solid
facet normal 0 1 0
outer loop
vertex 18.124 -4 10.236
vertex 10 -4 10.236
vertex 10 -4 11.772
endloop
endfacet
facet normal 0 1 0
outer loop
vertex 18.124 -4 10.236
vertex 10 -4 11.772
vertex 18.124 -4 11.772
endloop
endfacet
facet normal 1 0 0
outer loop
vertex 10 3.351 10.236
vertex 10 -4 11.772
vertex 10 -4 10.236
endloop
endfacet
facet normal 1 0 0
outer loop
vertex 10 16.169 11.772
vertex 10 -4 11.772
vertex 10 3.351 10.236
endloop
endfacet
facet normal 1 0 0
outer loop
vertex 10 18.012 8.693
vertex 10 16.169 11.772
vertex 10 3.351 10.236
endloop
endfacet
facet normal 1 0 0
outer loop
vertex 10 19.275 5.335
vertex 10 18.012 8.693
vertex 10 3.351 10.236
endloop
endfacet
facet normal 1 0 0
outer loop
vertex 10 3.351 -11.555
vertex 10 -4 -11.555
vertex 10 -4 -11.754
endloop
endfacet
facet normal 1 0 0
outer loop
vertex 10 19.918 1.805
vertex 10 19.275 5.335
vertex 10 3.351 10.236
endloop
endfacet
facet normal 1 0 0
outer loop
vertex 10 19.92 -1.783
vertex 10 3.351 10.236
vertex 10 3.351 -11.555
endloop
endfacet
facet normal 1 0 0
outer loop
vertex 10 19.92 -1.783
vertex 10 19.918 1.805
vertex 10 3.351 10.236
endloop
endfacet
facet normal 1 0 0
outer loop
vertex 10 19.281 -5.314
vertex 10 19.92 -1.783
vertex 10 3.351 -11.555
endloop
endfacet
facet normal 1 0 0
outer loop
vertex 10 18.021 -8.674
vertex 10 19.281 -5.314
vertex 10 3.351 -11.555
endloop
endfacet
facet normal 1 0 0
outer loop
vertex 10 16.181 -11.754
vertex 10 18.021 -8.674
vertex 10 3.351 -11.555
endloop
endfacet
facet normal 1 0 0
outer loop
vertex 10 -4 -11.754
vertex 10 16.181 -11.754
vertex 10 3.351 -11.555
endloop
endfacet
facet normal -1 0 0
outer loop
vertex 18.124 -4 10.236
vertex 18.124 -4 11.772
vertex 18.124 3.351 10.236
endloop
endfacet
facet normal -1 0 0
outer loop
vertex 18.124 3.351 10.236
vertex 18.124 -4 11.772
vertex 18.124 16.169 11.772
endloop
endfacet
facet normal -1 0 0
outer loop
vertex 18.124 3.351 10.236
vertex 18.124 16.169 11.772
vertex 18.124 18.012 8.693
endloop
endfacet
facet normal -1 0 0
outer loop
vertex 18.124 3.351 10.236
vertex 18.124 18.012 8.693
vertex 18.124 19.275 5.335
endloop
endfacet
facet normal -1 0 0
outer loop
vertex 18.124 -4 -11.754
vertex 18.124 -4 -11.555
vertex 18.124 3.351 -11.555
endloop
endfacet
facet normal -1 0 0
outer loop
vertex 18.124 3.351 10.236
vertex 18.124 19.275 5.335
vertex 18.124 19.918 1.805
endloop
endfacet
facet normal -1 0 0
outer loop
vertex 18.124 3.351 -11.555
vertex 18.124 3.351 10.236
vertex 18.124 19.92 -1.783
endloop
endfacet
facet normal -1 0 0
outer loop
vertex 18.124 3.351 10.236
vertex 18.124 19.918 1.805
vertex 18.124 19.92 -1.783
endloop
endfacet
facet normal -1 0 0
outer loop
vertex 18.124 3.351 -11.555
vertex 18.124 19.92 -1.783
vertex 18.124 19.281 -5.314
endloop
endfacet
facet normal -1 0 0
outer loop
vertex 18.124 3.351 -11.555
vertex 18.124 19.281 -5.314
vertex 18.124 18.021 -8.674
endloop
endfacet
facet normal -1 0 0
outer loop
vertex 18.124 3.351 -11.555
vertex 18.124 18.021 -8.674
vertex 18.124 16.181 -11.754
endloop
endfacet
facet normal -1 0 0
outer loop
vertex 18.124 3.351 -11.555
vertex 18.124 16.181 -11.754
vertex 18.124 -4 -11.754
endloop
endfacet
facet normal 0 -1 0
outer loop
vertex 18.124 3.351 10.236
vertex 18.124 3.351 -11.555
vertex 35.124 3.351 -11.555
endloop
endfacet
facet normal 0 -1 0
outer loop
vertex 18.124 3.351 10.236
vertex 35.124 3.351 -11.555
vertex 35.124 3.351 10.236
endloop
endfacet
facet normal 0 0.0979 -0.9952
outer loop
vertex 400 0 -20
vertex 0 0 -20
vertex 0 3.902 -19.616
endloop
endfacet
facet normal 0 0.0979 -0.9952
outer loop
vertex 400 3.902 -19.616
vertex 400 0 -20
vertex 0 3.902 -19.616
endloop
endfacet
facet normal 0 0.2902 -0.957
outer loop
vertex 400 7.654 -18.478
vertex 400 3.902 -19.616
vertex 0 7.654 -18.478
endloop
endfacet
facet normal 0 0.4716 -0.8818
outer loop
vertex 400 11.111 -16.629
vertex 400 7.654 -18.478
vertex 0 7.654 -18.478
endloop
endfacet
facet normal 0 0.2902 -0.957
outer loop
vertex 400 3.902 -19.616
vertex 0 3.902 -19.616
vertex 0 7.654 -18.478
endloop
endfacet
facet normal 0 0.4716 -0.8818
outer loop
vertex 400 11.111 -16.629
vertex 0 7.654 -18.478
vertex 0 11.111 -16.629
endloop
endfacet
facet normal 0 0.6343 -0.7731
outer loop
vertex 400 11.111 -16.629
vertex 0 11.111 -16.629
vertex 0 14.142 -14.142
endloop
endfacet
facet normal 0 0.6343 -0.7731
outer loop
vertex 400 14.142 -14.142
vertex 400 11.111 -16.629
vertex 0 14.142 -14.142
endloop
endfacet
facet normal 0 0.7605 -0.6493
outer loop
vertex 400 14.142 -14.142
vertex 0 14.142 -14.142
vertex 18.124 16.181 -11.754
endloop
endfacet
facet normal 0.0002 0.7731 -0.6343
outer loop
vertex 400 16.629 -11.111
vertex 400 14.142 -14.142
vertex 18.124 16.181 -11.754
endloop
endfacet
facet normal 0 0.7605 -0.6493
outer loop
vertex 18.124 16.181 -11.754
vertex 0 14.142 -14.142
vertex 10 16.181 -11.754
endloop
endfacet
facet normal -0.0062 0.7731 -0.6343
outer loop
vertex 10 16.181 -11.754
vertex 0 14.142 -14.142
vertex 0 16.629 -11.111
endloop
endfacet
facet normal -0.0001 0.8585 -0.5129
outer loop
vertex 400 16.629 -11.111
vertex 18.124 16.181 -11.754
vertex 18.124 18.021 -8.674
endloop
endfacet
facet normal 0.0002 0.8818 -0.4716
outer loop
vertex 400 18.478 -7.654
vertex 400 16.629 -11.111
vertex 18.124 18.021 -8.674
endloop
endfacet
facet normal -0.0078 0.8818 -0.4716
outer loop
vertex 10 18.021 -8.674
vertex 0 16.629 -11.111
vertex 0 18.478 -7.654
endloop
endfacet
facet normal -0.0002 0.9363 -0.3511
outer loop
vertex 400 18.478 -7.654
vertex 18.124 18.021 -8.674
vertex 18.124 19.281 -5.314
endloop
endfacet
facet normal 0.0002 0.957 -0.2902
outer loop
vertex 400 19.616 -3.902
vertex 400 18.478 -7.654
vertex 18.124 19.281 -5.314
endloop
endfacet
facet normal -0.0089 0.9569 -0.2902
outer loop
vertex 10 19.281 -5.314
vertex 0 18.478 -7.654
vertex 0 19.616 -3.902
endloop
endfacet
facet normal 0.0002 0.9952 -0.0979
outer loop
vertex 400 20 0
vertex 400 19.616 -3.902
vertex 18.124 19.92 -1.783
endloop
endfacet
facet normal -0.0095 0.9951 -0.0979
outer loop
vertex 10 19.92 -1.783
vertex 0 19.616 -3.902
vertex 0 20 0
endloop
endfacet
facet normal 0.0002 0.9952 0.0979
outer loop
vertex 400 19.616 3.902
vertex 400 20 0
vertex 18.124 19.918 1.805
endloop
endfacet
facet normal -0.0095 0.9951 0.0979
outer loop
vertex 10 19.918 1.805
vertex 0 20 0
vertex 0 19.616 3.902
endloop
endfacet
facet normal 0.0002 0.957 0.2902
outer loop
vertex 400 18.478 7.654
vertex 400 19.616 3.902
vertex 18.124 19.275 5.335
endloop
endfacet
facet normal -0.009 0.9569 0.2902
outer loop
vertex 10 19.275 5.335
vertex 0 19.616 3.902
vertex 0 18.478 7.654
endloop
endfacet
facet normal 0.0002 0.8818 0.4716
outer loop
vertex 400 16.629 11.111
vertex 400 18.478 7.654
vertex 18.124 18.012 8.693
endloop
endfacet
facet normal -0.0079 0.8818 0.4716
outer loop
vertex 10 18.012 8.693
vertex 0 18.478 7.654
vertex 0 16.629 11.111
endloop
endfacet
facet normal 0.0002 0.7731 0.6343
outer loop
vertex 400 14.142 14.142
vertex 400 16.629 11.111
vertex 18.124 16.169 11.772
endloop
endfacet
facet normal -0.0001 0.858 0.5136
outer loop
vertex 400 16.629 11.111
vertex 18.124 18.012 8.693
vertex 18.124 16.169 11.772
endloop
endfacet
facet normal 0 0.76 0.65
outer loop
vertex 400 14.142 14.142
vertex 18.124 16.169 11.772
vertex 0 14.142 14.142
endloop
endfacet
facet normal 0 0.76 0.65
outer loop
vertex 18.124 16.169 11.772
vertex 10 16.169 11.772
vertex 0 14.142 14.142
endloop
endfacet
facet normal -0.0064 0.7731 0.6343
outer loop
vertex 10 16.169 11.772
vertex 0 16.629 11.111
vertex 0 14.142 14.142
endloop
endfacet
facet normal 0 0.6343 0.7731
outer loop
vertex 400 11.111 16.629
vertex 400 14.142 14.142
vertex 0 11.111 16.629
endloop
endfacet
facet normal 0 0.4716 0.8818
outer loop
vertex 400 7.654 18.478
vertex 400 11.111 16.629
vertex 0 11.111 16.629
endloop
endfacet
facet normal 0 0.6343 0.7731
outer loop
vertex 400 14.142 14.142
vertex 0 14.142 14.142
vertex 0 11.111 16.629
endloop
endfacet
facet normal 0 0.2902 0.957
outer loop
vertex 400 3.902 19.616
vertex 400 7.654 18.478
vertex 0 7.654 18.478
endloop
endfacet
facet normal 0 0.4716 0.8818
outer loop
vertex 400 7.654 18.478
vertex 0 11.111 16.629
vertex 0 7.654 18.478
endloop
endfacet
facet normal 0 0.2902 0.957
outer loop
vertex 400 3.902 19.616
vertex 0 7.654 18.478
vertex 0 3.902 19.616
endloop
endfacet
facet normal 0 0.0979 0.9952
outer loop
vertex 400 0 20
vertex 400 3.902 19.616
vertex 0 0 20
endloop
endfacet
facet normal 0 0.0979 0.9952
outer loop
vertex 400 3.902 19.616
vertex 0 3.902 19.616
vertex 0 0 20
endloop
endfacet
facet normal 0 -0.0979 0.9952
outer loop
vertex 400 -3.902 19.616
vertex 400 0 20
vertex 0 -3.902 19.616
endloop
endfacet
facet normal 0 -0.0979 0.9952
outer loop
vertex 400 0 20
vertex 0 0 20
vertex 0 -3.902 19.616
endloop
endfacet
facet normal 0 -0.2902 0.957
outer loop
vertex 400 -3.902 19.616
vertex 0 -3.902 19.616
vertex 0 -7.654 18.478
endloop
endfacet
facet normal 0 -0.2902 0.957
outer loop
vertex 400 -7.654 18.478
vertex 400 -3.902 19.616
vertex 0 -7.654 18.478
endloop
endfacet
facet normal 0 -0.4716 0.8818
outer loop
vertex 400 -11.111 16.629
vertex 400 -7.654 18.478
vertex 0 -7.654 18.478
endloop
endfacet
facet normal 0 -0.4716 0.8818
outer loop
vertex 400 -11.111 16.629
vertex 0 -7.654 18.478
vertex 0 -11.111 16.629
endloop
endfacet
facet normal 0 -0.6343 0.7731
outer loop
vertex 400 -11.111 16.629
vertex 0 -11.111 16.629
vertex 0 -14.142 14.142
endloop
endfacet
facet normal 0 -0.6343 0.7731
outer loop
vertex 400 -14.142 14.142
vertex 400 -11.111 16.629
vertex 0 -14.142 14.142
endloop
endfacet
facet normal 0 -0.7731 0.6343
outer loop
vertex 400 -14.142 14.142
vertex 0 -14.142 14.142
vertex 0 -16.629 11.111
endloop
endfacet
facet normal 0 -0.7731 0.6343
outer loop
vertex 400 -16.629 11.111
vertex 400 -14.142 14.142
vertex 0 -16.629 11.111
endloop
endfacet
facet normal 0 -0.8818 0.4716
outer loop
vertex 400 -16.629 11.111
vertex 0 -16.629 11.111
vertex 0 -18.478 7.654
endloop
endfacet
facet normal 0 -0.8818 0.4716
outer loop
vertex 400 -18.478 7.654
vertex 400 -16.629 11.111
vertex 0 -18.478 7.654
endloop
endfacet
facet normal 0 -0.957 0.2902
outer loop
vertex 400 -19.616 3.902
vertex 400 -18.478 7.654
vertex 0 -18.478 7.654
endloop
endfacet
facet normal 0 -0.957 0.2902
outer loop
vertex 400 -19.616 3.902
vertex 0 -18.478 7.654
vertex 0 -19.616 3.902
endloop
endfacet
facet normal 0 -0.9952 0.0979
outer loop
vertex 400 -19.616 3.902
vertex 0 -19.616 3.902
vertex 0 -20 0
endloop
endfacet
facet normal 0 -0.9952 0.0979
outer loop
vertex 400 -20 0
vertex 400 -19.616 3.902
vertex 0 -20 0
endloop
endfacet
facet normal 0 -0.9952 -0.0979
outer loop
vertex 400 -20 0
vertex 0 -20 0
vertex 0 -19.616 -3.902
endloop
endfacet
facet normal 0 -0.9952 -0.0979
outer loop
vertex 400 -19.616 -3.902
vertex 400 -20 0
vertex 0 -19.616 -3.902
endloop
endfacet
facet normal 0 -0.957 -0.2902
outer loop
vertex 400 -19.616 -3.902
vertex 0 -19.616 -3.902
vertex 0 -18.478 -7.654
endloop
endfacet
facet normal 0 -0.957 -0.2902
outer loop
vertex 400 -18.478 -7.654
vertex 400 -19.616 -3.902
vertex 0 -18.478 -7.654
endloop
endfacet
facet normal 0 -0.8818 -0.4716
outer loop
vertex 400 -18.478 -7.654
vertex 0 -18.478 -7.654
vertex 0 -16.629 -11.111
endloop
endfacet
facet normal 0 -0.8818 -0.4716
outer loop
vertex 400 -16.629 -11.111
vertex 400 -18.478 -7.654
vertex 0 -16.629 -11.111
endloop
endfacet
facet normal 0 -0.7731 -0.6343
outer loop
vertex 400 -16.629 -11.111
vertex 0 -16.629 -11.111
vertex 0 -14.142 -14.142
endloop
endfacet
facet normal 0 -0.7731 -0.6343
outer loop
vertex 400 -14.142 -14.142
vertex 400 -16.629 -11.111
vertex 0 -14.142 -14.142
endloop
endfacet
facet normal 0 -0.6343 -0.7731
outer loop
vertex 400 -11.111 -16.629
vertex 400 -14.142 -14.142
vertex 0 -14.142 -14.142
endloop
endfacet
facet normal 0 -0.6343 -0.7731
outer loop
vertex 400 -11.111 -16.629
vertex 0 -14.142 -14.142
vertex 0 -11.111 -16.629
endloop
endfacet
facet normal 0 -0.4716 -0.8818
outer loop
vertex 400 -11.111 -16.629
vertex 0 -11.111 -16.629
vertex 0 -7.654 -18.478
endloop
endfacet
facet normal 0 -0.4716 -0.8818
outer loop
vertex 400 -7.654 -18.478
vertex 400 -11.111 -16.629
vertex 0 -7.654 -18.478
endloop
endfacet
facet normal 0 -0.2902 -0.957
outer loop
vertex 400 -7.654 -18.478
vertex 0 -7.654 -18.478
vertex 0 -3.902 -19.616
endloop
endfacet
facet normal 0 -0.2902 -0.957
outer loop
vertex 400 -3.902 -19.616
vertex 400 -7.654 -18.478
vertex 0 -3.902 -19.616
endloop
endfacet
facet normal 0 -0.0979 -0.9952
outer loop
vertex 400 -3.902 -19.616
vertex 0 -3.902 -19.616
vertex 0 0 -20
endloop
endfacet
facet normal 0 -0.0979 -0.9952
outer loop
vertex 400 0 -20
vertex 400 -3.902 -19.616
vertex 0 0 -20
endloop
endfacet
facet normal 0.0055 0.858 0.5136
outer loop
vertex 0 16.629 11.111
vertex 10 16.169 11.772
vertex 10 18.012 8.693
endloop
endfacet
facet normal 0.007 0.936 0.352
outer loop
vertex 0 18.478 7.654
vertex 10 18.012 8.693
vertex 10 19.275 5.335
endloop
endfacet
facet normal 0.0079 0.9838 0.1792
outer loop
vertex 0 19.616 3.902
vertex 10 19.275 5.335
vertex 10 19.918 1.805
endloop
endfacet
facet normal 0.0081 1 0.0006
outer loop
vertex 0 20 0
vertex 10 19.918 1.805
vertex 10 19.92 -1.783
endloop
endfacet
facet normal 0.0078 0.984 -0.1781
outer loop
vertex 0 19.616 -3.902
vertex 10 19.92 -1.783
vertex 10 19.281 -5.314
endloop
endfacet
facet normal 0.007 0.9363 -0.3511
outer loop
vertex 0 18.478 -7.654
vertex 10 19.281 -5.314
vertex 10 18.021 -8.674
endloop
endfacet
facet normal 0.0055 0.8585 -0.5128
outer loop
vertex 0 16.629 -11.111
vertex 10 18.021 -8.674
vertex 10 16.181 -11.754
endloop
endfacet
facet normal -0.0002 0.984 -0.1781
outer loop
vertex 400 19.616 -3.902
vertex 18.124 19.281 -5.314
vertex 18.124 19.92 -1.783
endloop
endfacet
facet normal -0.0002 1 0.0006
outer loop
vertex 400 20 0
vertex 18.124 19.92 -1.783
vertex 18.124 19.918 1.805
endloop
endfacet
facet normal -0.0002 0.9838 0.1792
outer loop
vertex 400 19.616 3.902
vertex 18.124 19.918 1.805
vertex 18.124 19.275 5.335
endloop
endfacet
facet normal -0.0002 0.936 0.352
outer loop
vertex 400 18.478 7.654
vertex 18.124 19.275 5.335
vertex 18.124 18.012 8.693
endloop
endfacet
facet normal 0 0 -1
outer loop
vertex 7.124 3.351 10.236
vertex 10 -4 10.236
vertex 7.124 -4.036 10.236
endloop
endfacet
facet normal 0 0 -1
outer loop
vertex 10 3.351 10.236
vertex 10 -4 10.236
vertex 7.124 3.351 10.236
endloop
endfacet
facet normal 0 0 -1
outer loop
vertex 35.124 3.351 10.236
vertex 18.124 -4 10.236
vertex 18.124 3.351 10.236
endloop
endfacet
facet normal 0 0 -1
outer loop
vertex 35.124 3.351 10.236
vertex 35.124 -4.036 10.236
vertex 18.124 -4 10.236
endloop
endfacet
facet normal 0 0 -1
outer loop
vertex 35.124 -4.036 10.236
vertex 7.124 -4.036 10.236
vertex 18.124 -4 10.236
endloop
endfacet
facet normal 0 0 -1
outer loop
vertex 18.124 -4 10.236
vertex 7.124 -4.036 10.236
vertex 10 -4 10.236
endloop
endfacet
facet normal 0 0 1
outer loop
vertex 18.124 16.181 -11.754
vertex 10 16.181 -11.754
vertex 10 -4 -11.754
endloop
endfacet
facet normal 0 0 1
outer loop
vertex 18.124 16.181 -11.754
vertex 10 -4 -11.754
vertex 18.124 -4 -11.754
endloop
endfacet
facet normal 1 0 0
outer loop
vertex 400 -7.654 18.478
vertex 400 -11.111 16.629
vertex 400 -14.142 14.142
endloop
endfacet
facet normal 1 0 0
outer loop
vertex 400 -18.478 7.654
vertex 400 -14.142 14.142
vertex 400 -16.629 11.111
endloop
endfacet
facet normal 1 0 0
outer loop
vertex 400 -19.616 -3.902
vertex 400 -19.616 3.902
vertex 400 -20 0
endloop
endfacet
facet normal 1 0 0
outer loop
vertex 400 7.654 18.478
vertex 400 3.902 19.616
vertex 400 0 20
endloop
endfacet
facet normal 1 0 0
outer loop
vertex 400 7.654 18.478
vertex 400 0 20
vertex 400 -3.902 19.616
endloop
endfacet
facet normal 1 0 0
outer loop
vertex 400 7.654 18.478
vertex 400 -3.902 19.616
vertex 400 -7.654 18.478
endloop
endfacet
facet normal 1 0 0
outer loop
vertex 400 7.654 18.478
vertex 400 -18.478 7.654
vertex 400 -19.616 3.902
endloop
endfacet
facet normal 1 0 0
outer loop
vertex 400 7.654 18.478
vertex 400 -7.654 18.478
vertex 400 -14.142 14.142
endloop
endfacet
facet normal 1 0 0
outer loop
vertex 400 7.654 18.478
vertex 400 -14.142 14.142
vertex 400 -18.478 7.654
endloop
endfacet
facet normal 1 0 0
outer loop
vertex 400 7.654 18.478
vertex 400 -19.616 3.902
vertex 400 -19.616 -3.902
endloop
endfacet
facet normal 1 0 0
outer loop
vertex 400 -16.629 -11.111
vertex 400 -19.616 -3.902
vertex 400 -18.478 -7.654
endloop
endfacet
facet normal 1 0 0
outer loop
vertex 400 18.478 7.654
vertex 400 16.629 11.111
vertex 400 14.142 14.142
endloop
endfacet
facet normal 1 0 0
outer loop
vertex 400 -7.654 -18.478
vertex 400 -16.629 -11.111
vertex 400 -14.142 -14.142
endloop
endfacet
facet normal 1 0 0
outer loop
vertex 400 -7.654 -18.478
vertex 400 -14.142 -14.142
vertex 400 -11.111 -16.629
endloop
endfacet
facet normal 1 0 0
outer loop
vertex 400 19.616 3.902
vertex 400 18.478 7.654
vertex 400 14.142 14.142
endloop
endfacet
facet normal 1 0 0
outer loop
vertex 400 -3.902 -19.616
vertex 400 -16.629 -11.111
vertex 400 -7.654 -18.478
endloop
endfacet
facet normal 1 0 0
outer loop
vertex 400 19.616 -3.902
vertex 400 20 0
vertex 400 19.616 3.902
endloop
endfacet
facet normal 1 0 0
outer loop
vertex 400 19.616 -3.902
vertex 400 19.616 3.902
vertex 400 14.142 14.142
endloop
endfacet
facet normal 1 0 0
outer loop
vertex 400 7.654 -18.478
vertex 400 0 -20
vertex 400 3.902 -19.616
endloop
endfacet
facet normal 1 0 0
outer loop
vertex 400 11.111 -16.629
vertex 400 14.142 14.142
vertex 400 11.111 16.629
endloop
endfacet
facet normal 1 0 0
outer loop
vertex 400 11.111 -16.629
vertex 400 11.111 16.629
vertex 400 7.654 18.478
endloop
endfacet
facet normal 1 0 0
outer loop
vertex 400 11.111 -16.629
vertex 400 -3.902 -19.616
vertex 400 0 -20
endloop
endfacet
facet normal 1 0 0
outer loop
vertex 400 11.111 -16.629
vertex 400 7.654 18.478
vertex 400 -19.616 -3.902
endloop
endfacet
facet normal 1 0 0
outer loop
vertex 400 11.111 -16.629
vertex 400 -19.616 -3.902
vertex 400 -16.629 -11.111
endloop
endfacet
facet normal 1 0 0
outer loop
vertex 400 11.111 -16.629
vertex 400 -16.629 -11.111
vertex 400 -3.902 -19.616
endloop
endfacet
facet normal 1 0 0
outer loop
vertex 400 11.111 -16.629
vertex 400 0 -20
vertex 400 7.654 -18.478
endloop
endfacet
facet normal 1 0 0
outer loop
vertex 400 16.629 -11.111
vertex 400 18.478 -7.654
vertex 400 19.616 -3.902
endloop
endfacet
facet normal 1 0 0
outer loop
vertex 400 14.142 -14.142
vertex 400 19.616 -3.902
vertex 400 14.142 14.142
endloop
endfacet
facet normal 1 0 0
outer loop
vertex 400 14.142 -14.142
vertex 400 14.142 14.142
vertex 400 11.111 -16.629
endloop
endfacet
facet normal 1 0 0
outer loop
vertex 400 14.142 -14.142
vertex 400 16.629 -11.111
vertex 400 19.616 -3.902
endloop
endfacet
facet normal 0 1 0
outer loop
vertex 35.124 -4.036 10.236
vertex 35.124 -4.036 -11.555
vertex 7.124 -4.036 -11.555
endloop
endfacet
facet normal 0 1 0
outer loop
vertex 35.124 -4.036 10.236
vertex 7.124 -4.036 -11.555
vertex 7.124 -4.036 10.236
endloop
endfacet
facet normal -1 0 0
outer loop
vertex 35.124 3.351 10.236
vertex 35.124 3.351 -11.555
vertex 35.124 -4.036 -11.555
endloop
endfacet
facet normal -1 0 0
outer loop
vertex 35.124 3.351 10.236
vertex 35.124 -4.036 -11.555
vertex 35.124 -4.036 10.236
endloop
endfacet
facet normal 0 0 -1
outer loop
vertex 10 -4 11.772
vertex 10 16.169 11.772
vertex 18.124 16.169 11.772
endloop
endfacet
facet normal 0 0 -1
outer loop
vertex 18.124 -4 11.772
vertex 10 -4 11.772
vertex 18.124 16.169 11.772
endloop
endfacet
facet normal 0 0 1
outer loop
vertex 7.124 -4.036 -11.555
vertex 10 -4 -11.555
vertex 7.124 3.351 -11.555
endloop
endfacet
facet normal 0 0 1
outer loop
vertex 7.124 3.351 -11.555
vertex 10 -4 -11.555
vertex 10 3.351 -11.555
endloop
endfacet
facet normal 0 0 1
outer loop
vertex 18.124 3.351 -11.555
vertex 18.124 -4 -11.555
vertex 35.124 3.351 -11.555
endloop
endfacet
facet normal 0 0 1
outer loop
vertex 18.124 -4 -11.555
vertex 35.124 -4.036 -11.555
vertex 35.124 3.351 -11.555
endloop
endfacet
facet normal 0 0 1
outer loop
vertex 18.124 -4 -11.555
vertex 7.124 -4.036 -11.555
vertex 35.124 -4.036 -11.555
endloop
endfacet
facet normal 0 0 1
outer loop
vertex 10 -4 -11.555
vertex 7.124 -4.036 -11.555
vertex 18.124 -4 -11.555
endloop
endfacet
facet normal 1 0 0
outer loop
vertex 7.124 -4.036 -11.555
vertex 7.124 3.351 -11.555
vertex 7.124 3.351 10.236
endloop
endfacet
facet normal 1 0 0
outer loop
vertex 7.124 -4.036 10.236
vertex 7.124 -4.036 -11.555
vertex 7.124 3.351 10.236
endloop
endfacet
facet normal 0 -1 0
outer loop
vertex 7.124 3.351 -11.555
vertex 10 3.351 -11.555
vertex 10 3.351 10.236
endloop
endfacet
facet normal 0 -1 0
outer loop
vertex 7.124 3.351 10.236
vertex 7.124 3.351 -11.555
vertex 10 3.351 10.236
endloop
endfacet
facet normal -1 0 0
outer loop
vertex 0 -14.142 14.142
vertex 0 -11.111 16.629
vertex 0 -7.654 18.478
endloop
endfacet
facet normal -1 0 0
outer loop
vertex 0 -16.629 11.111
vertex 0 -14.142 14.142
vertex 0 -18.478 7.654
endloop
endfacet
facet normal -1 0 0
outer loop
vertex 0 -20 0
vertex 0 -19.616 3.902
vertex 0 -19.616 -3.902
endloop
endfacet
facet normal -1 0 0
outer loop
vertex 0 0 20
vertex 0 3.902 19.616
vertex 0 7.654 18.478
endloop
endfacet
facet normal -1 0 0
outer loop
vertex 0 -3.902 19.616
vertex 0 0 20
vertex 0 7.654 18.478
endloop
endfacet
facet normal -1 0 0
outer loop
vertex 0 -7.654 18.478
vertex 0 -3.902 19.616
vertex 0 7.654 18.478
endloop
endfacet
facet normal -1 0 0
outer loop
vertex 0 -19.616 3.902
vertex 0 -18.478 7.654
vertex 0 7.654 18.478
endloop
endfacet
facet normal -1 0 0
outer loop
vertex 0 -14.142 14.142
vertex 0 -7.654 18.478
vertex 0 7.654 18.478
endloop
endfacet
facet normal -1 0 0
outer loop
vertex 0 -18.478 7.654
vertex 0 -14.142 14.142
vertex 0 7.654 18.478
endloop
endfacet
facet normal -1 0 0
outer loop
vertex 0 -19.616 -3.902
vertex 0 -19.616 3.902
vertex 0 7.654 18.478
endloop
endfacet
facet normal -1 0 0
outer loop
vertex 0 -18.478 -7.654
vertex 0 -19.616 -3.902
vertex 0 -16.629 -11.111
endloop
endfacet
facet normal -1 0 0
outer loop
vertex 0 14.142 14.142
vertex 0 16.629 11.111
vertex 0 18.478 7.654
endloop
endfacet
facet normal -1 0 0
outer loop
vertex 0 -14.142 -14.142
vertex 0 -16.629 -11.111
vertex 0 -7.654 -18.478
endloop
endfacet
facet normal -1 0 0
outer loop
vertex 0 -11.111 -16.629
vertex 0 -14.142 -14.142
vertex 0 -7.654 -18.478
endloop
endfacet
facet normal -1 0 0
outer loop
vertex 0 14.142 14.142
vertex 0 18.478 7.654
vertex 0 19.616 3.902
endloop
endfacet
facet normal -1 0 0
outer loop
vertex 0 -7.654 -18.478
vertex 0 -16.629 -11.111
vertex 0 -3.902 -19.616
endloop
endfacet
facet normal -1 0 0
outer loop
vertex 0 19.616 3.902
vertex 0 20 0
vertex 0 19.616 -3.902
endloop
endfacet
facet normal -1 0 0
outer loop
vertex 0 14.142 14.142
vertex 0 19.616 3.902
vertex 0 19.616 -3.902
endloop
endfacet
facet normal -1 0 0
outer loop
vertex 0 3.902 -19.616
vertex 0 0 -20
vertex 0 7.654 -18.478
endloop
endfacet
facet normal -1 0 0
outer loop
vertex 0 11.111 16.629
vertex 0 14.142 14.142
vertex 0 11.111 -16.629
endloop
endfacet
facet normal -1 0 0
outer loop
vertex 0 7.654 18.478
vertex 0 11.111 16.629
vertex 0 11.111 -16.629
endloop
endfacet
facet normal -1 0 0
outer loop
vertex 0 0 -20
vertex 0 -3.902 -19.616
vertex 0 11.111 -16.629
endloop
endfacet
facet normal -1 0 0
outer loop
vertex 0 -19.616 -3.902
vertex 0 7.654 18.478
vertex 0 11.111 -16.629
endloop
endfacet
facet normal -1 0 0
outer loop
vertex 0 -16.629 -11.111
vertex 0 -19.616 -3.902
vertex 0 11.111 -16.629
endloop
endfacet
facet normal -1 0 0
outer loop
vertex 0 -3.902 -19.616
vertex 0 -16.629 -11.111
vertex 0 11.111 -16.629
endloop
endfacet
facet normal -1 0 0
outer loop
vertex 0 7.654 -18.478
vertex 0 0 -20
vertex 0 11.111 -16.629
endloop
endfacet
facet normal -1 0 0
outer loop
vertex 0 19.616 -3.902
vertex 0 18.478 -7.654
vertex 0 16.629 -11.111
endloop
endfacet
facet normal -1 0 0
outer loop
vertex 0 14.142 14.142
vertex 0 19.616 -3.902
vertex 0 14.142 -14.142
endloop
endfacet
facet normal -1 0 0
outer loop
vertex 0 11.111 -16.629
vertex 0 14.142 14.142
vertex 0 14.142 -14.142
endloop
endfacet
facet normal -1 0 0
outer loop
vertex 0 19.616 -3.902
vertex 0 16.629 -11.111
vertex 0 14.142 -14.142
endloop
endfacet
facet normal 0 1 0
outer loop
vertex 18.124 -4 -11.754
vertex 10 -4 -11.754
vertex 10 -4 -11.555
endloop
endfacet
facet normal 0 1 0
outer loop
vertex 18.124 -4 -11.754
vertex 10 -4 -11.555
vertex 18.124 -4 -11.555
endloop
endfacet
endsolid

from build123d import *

# Parameters (mm, degrees)
SKETCH2_R           = 20
BOSS_EXTRUDE1_DEPTH = 400
SKETCH3_W           = 8.124111934
SKETCH3_H           = 23.526074142
CUT_EXTRUDE1_DEPTH  = 24
SKETCH5_W           = 21.791522519
SKETCH5_H           = 7.386956786
CUT_EXTRUDE2_DEPTH  = 17
SKETCH5_2_W         = 21.791522519
SKETCH5_2_H         = 7.386956786
CUT_EXTRUDE3_DEPTH  = 11


with BuildPart() as part:
    # Sketch2 → Boss-Extrude1 (new body)
    with BuildSketch(Plane(origin=(0, 0, 0), x_dir=(0, 0, -1), z_dir=(1, 0, 0))):
        Circle(SKETCH2_R)
    extrude(amount=BOSS_EXTRUDE1_DEPTH)

    # Sketch3 → Cut-Extrude1 (cut)
    with BuildSketch(Plane(origin=(0, 20, 0), x_dir=(1, 0, 0), z_dir=(0, 1, 0))):
        with Locations((14.062055967, -0.008909978)):
            Rectangle(SKETCH3_W, SKETCH3_H)
    extrude(amount=-CUT_EXTRUDE1_DEPTH, mode=Mode.SUBTRACT)

    # Sketch5 → Cut-Extrude2 (cut)
    with BuildSketch(Plane.ZY.offset(-18.124111934)):
        with Locations((-0.659549714, -0.342965851)):
            Rectangle(SKETCH5_W, SKETCH5_H)
    extrude(amount=-CUT_EXTRUDE2_DEPTH, mode=Mode.SUBTRACT)

    # Sketch5<2> → Cut-Extrude3 (cut)
    with BuildSketch(Plane.ZY.offset(-18.124111934)):
        with Locations((-0.659549714, -0.342965851)):
            Rectangle(SKETCH5_2_W, SKETCH5_2_H)
    extrude(amount=CUT_EXTRUDE3_DEPTH, mode=Mode.SUBTRACT)


solid = part.part
